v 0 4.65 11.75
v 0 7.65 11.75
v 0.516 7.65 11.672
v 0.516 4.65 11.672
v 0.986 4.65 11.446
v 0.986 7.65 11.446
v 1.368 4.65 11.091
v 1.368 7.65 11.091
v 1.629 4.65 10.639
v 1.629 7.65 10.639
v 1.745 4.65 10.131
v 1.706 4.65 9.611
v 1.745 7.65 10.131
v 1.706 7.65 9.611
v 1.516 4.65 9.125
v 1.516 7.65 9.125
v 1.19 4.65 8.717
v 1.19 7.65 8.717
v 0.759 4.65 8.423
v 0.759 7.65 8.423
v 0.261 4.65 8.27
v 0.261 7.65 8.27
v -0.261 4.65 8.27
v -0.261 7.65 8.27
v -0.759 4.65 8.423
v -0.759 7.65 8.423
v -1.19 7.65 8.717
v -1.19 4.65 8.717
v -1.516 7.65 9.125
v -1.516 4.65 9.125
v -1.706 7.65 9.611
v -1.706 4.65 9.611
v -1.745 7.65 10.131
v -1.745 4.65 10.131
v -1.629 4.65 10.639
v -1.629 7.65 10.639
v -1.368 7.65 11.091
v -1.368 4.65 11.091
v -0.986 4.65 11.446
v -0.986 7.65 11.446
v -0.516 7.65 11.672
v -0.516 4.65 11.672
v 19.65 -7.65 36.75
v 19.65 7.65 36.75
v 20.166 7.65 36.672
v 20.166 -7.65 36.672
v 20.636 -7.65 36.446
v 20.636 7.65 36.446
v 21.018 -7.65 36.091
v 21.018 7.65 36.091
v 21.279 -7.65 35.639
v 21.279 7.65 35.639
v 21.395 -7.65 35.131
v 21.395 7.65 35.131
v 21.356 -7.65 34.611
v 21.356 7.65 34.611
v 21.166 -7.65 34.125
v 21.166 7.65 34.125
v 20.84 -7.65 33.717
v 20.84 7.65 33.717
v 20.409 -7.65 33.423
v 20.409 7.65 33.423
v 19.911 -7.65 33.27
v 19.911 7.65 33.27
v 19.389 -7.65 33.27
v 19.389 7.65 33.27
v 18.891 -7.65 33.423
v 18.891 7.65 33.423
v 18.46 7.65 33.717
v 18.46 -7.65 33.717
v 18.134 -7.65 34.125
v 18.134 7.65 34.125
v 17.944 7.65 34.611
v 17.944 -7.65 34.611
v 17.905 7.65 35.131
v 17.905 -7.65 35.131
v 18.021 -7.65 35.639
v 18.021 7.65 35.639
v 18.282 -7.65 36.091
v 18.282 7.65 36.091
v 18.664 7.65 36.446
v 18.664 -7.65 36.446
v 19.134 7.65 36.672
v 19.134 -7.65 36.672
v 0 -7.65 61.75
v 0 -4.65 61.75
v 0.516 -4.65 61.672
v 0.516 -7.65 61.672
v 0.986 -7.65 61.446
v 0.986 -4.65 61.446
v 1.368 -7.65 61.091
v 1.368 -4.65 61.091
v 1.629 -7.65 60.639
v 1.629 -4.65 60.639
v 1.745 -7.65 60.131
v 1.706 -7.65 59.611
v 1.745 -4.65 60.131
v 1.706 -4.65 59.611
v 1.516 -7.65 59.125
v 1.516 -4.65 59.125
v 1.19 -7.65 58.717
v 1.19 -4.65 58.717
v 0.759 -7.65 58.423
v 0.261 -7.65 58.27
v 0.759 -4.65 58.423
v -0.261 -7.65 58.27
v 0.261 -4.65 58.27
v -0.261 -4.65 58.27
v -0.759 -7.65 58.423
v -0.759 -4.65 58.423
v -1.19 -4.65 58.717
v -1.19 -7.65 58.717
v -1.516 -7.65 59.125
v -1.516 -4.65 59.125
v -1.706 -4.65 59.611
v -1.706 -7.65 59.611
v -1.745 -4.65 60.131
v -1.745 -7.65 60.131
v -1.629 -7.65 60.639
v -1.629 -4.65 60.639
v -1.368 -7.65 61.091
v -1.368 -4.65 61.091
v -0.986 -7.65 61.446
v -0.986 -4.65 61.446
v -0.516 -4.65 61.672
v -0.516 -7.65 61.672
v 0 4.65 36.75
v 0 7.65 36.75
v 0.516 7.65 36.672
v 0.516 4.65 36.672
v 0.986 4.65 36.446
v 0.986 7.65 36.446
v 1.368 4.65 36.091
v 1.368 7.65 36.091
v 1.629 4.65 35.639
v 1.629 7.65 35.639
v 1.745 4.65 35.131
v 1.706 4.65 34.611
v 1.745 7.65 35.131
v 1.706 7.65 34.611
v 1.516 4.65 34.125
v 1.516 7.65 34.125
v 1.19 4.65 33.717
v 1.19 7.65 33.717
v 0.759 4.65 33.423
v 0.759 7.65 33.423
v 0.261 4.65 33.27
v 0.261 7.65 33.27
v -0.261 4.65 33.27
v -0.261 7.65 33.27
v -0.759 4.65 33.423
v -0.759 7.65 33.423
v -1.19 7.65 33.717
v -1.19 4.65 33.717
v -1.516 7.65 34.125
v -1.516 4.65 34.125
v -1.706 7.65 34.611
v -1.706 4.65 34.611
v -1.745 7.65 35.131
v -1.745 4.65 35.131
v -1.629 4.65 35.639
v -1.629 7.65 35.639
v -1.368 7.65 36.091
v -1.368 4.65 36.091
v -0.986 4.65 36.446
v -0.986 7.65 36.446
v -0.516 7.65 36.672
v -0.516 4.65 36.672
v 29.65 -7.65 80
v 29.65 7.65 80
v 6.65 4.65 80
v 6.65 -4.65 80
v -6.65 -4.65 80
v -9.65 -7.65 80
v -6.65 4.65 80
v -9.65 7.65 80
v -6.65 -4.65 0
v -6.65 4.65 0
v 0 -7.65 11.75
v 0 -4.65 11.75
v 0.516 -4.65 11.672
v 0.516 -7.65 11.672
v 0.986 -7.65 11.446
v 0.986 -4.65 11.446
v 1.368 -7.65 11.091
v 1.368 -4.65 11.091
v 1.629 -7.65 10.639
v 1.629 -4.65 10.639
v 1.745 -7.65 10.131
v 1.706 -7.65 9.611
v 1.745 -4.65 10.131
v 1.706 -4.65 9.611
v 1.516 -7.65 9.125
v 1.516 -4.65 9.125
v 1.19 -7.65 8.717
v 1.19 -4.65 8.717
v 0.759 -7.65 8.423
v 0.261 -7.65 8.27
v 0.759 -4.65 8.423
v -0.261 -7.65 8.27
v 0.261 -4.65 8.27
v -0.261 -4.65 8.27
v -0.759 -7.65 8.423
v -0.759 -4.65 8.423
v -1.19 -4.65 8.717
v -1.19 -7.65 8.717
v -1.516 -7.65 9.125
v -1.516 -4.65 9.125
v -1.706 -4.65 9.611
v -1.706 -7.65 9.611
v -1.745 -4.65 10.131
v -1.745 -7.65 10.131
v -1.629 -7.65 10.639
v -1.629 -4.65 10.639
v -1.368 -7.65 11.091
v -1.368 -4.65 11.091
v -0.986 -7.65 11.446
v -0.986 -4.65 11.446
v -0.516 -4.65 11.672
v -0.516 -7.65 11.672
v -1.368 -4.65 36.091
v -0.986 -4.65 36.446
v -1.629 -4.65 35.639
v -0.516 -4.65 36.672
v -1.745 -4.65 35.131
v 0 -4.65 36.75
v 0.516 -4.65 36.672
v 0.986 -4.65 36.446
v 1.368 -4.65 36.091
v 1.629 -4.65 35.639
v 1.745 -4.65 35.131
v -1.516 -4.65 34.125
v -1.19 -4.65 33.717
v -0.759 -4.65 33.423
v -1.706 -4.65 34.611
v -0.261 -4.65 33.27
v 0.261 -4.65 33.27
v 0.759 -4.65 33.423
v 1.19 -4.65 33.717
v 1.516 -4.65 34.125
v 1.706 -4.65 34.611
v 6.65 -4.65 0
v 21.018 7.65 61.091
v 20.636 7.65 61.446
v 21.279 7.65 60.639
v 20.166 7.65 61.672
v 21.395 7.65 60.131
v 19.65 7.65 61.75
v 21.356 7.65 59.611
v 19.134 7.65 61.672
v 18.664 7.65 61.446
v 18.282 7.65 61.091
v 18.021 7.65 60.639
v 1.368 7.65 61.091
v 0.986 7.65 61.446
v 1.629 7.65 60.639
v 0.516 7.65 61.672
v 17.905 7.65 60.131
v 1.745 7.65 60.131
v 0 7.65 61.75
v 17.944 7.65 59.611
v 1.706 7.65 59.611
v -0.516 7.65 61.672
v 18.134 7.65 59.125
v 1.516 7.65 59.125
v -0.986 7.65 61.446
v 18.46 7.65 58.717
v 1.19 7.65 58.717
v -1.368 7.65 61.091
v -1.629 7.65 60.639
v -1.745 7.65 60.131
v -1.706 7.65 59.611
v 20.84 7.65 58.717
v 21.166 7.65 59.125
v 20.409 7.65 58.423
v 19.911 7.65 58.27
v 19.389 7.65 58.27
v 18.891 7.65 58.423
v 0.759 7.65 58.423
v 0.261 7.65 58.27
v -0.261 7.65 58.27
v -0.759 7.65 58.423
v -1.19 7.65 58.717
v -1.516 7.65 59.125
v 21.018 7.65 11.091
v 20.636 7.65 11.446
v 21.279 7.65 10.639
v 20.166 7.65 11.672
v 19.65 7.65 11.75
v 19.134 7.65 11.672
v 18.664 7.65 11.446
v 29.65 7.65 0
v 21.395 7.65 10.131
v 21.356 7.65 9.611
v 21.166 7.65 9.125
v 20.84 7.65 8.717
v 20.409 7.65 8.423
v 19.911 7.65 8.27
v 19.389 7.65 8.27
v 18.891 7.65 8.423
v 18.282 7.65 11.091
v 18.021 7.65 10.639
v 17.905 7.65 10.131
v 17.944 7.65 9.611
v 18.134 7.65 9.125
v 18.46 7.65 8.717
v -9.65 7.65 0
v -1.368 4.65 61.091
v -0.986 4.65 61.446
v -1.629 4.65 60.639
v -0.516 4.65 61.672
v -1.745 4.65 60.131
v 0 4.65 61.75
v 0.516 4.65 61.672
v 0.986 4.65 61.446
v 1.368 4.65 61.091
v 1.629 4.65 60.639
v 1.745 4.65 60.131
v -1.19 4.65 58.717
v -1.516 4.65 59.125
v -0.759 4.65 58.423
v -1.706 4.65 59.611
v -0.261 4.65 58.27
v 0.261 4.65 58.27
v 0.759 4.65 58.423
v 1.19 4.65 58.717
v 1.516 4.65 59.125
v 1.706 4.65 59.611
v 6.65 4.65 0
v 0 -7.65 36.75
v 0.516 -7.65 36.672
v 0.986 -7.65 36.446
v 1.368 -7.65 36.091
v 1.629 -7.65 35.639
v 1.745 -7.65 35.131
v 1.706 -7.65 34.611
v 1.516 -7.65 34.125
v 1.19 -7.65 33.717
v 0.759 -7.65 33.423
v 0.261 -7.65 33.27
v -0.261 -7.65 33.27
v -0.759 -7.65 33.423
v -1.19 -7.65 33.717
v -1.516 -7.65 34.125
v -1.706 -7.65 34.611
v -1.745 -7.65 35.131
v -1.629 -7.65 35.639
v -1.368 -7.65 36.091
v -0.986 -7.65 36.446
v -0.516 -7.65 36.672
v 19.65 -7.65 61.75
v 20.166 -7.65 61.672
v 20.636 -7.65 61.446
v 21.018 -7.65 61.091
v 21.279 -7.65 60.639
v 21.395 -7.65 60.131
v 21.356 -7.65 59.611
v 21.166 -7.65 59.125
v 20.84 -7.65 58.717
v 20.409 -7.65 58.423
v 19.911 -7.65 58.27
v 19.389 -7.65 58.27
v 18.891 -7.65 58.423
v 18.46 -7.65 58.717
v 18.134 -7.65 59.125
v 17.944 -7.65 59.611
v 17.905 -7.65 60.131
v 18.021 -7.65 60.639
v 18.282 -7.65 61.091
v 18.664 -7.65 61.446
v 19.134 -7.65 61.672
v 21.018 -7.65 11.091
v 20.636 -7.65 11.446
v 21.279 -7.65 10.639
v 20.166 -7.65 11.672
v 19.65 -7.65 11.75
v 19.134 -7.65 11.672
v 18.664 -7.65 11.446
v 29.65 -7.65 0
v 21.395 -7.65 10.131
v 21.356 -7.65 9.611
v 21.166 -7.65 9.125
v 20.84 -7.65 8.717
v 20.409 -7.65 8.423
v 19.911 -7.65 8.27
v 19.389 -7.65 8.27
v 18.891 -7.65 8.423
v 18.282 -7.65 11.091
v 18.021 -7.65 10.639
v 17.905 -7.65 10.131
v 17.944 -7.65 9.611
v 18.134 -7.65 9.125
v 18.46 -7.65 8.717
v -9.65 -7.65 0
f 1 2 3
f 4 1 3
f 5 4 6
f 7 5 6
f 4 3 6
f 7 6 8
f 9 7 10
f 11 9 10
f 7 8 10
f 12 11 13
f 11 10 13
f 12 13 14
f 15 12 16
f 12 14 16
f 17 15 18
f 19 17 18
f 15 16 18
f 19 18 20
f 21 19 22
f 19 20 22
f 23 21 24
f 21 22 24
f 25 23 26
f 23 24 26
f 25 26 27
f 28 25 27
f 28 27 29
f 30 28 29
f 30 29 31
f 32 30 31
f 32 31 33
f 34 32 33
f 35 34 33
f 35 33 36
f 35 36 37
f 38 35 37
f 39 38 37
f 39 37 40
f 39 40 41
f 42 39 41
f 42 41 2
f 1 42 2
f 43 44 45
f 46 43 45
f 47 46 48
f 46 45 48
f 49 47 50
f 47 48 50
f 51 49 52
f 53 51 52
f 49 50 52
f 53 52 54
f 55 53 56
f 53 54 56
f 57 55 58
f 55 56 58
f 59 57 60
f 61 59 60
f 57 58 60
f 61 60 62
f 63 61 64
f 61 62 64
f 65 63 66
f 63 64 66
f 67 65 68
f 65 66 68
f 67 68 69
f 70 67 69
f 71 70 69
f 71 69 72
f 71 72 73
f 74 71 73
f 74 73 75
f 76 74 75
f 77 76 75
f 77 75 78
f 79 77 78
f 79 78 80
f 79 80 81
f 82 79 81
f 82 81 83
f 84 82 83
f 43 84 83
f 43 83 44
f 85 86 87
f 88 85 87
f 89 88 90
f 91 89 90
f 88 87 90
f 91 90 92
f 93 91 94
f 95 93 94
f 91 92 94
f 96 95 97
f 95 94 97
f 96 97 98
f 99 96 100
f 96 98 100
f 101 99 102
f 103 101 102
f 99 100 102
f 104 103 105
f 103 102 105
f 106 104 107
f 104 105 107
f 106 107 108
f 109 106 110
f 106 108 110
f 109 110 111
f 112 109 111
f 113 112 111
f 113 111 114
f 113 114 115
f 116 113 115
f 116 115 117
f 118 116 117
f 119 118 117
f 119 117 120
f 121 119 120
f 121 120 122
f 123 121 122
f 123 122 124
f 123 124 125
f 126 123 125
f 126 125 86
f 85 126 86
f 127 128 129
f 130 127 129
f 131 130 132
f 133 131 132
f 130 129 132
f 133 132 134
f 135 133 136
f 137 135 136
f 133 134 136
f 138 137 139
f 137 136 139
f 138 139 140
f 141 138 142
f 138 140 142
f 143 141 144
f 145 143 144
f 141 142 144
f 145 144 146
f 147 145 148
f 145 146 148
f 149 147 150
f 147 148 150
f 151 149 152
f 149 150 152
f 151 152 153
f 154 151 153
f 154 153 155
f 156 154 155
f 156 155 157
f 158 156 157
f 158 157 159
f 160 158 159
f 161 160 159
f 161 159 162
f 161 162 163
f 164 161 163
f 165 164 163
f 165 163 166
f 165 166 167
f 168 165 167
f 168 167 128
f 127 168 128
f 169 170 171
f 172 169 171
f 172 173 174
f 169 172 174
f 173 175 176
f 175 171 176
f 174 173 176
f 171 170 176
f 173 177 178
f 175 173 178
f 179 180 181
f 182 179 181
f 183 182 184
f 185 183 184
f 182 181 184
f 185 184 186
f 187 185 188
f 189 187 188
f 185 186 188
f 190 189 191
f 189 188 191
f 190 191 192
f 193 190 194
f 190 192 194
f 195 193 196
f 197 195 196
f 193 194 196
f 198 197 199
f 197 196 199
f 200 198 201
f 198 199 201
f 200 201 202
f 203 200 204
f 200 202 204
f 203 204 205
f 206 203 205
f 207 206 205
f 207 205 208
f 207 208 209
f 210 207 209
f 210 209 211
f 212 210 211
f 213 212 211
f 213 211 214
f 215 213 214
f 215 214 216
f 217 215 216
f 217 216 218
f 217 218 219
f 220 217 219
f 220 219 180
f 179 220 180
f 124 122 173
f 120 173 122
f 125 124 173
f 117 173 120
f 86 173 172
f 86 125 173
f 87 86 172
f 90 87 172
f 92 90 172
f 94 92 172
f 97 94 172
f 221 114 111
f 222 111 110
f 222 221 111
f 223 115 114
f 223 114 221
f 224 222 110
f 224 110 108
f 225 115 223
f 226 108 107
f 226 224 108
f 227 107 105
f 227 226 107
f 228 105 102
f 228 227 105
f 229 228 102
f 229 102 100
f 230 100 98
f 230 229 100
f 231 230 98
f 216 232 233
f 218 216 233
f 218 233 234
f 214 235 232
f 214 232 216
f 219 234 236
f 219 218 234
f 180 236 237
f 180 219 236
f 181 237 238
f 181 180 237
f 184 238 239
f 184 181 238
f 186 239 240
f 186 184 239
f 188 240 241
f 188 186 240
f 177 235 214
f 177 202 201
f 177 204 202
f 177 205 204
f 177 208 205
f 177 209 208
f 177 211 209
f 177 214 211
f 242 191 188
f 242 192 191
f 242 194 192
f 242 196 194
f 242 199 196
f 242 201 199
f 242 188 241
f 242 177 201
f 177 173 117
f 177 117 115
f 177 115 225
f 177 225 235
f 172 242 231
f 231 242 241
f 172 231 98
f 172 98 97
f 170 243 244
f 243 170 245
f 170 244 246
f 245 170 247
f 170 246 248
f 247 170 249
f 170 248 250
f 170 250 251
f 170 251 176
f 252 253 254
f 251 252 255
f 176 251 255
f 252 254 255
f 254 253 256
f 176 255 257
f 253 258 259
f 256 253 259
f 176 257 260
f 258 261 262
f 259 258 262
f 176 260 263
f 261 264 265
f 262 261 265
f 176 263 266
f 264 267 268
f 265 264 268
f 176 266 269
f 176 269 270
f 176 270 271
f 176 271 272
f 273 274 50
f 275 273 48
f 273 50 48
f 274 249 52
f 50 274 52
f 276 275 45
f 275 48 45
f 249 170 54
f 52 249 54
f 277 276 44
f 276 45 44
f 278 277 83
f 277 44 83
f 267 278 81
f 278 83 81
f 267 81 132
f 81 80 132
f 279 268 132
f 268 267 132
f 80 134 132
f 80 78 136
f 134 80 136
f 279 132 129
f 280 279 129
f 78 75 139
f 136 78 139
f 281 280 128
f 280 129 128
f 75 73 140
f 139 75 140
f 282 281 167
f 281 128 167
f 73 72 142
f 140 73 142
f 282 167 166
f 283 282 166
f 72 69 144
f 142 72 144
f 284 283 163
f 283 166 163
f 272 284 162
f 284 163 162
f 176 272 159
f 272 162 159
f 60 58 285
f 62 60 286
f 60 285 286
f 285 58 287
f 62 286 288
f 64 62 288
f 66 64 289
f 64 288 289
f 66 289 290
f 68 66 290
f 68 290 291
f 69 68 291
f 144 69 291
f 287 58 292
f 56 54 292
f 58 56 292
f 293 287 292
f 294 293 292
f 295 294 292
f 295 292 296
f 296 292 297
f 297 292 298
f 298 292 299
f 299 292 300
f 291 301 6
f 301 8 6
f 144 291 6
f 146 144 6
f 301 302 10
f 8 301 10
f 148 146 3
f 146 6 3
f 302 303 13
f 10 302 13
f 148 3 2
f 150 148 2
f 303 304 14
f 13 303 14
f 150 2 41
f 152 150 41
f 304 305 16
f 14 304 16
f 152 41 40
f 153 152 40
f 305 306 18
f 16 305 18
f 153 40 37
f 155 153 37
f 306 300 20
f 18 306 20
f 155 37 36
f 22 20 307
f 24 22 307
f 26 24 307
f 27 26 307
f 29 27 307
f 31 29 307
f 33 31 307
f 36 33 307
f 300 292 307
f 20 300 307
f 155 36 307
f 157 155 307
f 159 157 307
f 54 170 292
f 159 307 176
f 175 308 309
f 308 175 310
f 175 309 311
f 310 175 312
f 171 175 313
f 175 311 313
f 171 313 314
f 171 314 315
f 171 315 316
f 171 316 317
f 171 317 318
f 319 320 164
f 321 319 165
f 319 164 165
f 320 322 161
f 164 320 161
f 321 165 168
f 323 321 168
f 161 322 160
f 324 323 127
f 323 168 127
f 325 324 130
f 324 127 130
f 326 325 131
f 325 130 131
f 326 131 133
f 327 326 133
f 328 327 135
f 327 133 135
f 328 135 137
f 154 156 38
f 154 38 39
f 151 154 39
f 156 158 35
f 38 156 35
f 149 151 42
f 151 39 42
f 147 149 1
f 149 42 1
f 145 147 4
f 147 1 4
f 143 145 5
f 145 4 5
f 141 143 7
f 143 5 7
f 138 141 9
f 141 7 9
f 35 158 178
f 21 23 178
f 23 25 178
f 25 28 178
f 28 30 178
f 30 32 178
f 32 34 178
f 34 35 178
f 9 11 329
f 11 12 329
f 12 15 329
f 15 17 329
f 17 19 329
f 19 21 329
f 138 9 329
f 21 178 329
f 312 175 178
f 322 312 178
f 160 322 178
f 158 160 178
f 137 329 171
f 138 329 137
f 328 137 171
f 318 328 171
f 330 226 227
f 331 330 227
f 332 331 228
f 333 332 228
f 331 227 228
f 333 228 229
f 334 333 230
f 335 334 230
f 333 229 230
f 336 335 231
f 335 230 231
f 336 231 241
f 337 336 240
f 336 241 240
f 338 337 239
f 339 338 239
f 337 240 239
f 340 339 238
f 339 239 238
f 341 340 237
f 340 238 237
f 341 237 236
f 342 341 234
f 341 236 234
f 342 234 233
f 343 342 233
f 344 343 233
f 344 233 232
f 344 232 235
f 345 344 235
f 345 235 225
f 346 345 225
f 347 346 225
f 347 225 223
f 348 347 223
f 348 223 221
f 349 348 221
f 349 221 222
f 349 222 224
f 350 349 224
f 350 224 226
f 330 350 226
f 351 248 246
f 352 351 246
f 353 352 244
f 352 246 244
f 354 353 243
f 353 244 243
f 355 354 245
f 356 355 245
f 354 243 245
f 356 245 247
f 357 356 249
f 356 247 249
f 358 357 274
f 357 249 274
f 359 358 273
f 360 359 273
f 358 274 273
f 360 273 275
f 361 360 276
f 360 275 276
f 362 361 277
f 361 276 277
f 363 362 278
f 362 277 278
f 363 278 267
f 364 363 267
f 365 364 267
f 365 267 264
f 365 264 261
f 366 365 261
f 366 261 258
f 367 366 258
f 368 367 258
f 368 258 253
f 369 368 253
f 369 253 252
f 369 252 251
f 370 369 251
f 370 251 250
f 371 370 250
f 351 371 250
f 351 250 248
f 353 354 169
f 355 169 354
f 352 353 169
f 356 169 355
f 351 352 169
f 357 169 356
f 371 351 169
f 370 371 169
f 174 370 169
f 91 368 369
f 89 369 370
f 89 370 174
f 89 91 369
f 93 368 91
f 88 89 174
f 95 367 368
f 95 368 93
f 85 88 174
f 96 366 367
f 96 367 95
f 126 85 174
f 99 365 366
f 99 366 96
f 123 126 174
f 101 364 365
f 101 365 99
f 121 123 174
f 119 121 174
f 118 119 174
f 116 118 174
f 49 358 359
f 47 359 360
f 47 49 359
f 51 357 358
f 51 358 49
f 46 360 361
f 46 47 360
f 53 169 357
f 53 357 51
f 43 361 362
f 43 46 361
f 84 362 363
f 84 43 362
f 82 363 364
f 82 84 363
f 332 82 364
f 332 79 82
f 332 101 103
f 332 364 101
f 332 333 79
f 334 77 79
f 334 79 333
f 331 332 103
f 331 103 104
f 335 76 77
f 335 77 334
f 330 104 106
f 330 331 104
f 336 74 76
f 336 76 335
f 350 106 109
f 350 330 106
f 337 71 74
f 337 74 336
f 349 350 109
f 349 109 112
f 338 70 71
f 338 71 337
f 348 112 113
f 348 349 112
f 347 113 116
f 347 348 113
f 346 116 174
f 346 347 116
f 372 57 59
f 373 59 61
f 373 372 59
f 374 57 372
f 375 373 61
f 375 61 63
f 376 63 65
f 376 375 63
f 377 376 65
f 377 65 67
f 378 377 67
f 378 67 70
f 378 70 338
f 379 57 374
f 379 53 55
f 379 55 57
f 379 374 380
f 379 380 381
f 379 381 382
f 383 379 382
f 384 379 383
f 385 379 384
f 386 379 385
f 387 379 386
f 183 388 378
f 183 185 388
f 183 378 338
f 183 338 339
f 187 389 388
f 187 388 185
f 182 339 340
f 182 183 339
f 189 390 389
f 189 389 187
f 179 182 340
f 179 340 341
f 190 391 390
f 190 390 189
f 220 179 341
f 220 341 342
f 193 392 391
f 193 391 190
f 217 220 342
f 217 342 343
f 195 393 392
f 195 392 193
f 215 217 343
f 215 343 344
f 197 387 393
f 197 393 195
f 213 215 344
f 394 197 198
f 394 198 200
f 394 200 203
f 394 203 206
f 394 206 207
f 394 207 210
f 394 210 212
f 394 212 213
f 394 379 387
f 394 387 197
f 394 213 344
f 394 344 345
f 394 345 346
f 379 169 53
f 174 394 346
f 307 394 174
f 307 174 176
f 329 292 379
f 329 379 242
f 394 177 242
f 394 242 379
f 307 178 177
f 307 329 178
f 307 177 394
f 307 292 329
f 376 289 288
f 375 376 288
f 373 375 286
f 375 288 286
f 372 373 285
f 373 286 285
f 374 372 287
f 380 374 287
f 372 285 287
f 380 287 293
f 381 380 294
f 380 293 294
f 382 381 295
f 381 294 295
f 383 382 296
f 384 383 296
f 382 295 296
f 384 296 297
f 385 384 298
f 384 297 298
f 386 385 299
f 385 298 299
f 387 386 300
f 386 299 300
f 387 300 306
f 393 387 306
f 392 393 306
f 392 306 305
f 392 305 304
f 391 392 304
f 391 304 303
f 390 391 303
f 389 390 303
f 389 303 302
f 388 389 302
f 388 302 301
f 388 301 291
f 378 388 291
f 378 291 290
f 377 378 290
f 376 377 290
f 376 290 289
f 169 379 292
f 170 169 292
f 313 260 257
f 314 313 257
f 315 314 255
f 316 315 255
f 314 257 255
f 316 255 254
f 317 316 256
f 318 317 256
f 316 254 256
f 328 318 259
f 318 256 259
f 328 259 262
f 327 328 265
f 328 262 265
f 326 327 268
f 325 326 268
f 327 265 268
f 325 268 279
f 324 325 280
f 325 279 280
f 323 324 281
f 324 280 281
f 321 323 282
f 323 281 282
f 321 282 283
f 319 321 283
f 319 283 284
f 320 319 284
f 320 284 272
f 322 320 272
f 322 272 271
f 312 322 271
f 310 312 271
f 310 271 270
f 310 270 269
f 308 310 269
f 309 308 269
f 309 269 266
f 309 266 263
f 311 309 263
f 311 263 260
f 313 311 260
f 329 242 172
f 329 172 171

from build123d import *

# Parameters (mm, degrees)
SKETCH_2_W          = 19.3
SKETCH_2_H          = 15.3
SKETCH_2_W_2        = 13.3
SKETCH_2_H_2        = 9.3
EXTRUDE_1_DEPTH     = 80
SKETCH_3_R          = 1.75
CUT_EXTRUDE_1_DEPTH = 100
SKETCH_5_W          = 20
SKETCH_5_H          = 15.3
EXTRUDE_2_DEPTH     = 80
SKETCH_6_R          = 1.75
CUT_EXTRUDE_2_DEPTH = 100


with BuildPart() as part:
    # 草图2 → 凸台-拉伸1 (new body)
    with BuildSketch(Plane.XY):
        Rectangle(SKETCH_2_W, SKETCH_2_H)
        Rectangle(SKETCH_2_W_2, SKETCH_2_H_2, mode=Mode.SUBTRACT)
    extrude(amount=EXTRUDE_1_DEPTH)

    # 草图3 → 切除-拉伸1 (cut)
    with BuildSketch(Plane(origin=(0, 7.65, 0), x_dir=(1, 0, 0), z_dir=(0, 1, 0))):
        with Locations(Location((0, -10, 0), (0, 0, 270))):
            Circle(SKETCH_3_R)
        with Locations(Location((0, -35, 0), (0, 0, 270))):
            Circle(SKETCH_3_R)
        with Locations(Location((0, -60, 0), (0, 0, 270))):
            Circle(SKETCH_3_R)
    extrude(amount=-CUT_EXTRUDE_1_DEPTH, mode=Mode.SUBTRACT)

    # 草图5 → 凸台-拉伸2 (add)
    with BuildSketch(Plane(origin=(0, 0, 0), x_dir=(-1, 0, 0), z_dir=(0, 0, -1))):
        with Locations((-19.65, 0)):
            Rectangle(SKETCH_5_W, SKETCH_5_H)
    extrude(amount=-EXTRUDE_2_DEPTH)

    # 草图6 → 切除-拉伸2 (cut)
    with BuildSketch(Plane(origin=(0, 7.65, 0), x_dir=(1, 0, 0), z_dir=(0, 1, 0))):
        with Locations(Location((19.65, -10, 0), (0, 0, 270))):
            Circle(SKETCH_6_R)
        with Locations(Location((19.65, -35, 0), (0, 0, 270))):
            Circle(SKETCH_6_R)
        with Locations(Location((19.65, -60, 0), (0, 0, 270))):
            Circle(SKETCH_6_R)
    extrude(amount=-CUT_EXTRUDE_2_DEPTH, mode=Mode.SUBTRACT)


solid = part.part
